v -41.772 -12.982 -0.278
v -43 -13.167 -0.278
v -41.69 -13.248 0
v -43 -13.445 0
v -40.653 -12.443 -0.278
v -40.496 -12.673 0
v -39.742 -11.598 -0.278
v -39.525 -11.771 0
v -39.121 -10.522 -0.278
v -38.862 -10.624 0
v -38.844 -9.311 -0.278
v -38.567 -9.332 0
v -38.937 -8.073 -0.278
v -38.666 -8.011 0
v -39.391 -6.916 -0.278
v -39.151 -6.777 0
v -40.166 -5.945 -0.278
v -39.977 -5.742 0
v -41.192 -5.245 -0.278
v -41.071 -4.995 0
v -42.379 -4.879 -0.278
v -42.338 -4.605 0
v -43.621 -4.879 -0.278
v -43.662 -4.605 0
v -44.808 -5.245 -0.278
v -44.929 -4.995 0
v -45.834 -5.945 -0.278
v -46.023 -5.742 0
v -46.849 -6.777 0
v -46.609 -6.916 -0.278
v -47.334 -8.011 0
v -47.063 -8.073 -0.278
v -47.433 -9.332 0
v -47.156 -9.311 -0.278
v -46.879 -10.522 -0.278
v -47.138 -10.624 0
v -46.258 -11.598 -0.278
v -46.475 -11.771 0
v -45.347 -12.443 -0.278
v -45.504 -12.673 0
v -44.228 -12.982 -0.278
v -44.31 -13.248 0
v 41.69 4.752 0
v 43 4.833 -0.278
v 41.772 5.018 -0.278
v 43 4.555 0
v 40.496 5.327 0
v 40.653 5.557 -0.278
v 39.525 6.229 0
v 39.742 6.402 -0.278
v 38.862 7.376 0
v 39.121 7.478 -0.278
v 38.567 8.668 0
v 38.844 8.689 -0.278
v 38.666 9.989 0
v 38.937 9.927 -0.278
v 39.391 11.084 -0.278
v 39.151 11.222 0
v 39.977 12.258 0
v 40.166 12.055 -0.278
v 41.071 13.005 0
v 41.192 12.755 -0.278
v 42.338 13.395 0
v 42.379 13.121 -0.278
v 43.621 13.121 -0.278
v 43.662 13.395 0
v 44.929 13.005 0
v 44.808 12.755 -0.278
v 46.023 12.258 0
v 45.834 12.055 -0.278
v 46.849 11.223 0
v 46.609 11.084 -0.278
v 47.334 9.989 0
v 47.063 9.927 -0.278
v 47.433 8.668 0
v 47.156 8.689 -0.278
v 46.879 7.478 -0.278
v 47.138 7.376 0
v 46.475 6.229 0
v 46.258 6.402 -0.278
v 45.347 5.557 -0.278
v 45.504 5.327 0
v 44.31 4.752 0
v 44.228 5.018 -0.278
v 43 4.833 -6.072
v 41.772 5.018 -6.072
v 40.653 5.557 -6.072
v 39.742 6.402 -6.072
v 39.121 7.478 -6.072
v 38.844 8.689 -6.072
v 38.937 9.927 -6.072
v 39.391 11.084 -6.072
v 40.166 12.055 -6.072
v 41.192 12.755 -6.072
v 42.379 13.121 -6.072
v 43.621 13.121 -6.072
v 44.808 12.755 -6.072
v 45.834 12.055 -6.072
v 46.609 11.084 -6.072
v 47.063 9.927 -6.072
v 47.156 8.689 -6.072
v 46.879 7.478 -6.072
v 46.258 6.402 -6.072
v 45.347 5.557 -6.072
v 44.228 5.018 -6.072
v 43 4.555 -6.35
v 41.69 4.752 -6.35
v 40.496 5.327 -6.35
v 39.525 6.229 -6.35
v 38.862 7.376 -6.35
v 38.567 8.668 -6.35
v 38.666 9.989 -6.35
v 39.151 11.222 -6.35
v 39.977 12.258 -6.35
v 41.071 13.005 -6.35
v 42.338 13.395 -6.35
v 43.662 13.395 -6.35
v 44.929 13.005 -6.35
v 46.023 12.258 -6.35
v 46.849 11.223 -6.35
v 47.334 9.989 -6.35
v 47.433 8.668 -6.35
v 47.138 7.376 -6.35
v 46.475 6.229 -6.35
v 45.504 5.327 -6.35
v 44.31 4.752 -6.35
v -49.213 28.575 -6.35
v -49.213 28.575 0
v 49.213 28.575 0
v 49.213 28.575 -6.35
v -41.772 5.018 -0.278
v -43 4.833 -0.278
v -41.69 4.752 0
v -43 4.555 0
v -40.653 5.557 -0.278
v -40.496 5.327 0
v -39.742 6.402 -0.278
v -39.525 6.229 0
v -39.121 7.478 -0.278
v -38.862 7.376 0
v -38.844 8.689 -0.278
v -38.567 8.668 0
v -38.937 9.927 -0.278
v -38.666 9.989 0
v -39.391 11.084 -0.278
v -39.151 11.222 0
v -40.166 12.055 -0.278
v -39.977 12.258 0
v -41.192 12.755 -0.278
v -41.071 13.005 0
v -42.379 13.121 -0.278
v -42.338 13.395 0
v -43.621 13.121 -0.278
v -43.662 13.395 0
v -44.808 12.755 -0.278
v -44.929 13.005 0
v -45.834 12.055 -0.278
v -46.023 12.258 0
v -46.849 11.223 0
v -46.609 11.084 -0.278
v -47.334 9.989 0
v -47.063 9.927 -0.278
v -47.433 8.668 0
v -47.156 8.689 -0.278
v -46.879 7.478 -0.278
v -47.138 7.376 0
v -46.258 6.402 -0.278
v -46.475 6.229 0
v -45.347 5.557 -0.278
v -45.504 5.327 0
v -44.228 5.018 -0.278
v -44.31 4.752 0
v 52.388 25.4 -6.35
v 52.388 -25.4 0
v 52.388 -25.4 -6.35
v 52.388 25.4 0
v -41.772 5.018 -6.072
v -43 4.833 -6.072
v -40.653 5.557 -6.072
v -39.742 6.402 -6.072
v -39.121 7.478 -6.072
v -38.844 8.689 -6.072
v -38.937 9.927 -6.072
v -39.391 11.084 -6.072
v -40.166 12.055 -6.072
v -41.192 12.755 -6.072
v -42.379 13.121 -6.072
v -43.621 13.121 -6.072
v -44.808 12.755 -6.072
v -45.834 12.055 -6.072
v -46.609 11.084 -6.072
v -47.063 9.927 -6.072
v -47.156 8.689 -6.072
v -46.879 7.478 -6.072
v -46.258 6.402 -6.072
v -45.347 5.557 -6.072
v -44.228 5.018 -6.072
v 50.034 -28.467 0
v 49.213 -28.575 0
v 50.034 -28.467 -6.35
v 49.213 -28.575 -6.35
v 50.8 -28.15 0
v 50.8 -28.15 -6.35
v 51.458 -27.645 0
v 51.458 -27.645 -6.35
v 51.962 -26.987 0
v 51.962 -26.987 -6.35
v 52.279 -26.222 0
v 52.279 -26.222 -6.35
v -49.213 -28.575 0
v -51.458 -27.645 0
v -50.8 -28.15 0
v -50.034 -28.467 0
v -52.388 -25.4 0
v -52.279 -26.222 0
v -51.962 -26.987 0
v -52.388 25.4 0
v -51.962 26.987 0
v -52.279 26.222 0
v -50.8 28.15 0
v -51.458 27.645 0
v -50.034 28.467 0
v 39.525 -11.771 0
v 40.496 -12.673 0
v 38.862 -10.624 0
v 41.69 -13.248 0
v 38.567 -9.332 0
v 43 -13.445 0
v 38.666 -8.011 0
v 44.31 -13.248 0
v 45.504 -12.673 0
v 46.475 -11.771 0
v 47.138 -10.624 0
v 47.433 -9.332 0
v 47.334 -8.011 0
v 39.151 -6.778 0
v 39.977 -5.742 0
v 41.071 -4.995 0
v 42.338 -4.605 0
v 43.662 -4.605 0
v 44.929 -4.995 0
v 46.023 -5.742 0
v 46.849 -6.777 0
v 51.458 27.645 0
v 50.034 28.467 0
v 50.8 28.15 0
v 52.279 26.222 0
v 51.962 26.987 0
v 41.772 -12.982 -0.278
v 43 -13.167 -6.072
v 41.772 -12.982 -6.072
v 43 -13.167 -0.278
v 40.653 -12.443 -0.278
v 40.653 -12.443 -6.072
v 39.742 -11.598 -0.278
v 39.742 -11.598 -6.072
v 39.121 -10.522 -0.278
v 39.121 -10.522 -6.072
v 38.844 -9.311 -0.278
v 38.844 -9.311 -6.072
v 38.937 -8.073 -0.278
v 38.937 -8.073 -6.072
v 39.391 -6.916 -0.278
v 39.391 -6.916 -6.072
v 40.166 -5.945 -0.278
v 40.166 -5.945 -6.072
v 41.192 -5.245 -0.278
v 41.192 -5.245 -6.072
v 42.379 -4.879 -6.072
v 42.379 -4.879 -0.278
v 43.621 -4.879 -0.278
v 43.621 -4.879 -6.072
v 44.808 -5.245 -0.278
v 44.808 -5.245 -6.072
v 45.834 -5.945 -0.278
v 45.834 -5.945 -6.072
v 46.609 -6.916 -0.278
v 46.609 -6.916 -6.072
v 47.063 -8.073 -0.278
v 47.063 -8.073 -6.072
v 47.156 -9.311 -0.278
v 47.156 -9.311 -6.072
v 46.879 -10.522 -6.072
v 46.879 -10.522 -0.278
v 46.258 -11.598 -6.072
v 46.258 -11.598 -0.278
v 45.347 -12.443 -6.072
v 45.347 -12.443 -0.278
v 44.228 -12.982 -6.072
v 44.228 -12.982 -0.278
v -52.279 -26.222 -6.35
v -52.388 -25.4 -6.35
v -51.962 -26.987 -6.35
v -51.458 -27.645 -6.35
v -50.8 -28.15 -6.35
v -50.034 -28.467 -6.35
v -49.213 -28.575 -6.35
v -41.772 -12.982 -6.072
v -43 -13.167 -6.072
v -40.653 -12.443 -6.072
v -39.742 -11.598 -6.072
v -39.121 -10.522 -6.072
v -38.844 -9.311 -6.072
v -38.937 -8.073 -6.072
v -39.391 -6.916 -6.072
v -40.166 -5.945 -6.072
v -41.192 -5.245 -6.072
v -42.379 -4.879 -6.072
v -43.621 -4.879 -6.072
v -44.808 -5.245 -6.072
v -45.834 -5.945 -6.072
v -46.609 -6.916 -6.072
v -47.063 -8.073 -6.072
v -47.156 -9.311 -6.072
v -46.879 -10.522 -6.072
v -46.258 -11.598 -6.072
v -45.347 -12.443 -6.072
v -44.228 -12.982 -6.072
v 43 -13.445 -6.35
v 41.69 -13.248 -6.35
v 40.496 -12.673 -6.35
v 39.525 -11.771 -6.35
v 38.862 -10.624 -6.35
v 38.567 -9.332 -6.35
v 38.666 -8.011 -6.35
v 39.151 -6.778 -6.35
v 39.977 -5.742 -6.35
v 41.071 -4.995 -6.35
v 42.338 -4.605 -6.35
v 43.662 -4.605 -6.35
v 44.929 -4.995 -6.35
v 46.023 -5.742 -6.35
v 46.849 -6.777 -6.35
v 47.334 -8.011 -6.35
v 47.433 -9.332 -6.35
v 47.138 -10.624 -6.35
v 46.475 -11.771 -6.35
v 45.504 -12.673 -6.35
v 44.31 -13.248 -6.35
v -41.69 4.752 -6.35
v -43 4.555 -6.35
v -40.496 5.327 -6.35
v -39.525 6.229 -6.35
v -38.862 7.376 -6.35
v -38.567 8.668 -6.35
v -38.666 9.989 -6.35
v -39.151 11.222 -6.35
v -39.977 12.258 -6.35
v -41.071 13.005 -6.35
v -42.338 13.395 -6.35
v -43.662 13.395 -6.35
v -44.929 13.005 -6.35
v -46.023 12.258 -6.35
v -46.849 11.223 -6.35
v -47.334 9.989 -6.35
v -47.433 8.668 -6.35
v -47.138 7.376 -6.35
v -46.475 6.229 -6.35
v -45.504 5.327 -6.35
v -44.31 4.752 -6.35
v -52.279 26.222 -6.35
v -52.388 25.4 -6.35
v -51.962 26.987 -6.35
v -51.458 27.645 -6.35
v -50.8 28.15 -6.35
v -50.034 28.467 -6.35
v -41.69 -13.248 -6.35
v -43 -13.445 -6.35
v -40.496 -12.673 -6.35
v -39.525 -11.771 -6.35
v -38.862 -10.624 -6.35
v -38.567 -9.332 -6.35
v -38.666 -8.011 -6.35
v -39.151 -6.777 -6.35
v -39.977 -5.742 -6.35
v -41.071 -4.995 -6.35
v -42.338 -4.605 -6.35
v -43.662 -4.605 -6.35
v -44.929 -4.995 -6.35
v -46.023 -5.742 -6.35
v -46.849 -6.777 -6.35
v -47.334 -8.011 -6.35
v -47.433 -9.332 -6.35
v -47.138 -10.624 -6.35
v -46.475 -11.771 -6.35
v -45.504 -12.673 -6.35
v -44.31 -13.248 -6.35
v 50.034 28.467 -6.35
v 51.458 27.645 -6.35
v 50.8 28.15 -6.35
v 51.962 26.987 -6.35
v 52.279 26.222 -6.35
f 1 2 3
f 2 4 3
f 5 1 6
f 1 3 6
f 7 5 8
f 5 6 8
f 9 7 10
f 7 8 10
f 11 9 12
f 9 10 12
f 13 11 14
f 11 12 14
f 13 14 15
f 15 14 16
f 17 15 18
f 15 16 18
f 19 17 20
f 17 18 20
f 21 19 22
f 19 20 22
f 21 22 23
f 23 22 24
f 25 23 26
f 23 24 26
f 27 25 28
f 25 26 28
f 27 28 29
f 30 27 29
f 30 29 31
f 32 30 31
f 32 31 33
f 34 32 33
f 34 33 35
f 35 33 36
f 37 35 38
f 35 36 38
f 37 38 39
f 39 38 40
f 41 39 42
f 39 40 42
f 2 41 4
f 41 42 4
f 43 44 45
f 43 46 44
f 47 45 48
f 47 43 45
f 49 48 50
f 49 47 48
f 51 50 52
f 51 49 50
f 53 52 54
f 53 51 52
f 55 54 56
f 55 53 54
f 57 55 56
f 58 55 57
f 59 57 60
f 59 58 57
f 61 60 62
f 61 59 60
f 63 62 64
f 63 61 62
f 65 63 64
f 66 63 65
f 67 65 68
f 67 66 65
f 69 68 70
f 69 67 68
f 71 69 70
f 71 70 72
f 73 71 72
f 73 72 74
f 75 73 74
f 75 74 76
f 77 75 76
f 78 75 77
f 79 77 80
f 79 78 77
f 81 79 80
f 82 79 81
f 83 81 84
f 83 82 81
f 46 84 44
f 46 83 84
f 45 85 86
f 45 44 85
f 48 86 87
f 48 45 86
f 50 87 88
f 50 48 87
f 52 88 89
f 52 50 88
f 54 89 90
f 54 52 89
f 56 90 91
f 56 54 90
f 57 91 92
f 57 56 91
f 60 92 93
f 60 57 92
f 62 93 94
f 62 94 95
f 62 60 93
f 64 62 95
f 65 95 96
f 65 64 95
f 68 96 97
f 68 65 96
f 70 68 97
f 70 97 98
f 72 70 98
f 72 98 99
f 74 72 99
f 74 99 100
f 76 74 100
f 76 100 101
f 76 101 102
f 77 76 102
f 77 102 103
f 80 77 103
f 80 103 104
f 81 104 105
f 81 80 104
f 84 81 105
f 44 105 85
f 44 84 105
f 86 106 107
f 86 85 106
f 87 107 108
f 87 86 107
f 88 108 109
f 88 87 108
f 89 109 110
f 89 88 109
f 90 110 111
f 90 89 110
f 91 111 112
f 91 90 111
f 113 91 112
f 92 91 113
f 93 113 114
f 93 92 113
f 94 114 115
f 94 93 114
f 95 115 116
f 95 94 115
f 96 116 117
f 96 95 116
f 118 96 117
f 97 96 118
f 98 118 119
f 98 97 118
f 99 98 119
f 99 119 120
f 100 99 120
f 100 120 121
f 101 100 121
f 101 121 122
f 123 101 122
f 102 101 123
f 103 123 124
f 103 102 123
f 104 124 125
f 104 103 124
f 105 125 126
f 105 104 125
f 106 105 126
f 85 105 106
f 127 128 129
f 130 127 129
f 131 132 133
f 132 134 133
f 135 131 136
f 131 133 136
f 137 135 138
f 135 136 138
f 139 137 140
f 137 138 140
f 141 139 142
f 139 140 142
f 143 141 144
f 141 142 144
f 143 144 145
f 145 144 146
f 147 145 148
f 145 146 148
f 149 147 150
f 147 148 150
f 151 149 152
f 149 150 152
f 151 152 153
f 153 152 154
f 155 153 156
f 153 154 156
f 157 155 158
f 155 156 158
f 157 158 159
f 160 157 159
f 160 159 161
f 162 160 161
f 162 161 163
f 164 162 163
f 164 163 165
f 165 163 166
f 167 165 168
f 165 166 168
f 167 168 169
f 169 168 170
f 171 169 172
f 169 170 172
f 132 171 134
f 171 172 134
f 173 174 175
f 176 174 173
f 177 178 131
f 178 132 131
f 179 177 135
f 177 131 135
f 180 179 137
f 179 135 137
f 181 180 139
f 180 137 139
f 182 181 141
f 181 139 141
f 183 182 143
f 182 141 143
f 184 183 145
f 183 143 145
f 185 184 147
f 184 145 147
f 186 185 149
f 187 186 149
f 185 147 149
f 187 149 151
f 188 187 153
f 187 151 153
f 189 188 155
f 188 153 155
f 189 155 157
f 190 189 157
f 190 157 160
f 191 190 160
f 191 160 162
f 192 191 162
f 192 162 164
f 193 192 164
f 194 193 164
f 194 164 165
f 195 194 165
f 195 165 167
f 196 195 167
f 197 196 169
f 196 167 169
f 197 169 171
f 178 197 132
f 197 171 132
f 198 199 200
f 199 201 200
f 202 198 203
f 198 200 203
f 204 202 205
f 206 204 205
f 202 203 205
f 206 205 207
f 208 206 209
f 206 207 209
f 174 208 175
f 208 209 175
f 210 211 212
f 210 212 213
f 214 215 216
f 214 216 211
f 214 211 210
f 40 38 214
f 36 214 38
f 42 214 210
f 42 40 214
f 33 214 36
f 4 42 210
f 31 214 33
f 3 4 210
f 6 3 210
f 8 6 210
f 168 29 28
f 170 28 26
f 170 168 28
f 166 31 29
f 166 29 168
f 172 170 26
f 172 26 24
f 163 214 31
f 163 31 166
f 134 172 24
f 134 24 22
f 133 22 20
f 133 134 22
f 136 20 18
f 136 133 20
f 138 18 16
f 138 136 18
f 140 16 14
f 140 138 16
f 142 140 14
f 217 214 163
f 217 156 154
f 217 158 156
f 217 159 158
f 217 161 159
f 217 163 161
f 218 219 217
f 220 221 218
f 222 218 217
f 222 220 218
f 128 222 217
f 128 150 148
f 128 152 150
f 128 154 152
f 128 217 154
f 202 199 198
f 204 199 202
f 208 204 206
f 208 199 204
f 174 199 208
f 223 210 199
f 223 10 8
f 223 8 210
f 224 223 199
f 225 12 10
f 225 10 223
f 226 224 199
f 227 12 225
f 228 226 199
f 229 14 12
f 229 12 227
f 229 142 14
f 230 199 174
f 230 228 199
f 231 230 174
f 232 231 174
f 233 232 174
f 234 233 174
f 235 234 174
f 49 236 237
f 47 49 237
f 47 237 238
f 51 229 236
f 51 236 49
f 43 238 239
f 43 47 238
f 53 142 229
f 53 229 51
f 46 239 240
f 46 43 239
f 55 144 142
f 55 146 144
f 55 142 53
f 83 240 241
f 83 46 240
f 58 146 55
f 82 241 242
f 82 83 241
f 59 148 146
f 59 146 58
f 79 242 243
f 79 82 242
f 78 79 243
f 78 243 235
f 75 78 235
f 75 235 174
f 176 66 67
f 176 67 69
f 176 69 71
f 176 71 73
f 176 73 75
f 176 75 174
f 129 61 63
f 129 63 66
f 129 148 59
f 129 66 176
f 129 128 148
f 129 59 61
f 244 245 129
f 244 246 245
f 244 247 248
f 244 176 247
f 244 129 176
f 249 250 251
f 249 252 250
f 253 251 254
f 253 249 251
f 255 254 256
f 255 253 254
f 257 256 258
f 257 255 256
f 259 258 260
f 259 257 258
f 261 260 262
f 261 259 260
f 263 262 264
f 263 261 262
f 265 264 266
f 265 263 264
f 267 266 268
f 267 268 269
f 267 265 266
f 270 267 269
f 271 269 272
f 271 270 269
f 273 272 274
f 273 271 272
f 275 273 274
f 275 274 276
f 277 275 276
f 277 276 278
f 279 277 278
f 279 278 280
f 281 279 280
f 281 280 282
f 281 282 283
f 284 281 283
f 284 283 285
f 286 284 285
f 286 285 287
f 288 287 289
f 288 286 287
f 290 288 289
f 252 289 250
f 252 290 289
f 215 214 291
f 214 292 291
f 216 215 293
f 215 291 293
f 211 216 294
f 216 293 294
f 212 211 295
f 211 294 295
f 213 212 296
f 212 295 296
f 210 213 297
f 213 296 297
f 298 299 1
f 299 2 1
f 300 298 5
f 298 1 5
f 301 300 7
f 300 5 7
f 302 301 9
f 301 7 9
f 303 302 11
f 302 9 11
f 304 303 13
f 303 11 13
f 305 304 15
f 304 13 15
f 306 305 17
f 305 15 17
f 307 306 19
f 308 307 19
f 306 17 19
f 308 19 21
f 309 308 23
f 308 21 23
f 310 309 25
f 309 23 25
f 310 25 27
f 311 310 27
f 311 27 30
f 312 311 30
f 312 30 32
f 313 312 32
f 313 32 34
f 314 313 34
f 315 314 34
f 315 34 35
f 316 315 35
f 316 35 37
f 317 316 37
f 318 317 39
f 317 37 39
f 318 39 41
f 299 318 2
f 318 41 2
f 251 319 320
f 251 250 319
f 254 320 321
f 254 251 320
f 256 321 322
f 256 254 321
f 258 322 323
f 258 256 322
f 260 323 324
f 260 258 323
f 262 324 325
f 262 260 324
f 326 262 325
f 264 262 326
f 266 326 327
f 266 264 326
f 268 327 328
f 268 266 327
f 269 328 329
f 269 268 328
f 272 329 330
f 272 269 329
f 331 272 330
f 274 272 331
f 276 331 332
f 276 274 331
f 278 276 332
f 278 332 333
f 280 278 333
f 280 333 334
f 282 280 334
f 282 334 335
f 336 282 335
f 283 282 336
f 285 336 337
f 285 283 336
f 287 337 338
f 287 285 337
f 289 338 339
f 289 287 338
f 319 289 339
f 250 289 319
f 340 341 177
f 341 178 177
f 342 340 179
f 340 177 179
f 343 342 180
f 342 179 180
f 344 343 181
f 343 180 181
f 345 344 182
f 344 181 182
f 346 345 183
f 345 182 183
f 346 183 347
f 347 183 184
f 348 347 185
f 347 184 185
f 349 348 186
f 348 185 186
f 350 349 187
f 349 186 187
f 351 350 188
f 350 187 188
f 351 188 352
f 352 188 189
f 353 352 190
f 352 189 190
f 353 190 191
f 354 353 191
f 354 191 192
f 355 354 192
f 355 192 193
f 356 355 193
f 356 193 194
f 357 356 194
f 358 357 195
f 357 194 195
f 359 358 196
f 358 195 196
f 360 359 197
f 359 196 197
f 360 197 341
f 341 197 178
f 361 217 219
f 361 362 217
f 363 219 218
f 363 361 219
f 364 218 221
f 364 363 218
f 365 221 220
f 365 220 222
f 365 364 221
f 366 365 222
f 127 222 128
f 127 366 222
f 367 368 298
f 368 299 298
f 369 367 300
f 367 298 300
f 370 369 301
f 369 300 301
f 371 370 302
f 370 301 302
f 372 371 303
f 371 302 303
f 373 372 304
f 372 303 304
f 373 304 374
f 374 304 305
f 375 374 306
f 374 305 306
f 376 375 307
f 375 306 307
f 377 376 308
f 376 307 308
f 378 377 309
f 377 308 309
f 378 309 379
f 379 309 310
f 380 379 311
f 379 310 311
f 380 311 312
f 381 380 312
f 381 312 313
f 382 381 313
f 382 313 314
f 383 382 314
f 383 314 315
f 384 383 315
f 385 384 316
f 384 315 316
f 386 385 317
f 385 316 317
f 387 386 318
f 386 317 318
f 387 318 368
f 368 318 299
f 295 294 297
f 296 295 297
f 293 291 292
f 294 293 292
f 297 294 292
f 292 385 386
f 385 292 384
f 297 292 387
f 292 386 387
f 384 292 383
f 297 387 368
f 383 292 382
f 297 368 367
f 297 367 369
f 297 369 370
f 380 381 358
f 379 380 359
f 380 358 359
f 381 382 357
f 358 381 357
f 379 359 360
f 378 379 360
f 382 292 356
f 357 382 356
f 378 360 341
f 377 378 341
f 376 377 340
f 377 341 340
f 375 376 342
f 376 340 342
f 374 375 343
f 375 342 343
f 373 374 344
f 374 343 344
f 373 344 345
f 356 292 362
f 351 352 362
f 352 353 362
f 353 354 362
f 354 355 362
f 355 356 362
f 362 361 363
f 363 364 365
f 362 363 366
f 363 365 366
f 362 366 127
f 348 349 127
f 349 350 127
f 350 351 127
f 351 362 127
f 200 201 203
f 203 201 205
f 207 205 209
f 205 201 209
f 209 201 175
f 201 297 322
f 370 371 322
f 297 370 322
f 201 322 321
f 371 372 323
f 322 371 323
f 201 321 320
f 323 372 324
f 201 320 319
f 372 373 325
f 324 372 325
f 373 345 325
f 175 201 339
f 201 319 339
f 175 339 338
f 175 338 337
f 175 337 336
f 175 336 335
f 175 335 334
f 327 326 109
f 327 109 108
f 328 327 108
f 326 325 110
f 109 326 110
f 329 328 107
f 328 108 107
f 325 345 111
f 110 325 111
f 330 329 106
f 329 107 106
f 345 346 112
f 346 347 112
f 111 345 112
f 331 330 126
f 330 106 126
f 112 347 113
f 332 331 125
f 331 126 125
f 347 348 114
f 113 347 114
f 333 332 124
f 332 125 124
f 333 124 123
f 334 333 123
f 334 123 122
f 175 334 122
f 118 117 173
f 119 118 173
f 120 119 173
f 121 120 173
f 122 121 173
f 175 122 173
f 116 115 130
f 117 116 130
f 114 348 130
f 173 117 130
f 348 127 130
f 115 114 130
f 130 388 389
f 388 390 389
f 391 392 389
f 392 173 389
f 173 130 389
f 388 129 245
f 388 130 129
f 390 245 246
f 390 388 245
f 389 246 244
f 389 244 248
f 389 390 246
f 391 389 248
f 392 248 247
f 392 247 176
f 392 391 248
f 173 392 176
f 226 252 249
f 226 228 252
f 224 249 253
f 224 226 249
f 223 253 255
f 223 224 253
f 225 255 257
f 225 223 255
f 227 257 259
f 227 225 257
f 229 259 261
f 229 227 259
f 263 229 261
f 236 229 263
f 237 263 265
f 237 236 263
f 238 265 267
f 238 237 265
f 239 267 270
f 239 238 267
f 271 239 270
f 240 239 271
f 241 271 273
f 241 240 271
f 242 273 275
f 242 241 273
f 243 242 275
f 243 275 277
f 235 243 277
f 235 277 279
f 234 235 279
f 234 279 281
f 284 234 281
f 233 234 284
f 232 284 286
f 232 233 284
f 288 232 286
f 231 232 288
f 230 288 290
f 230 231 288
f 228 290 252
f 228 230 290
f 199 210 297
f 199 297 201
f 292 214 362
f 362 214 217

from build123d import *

# Parameters (mm, degrees)
SKETCH1_W                                 = 104.775
SKETCH1_H                                 = 57.15
BOSS_EXTRUDE1_DEPTH                       = 6.35
F_21_64_0_32813_DIAMETER_HOLE1_AT_2_COUNT = 2
F_21_64_0_32813_DIAMETER_HOLE1_AT_2_PITCH = 18
FILLET1_R                                 = 3.175


with BuildPart() as part:
    # Sketch1 → Boss-Extrude1 (new body)
    with BuildSketch(Plane.XY):
        Rectangle(SKETCH1_W, SKETCH1_H)
    extrude(amount=-BOSS_EXTRUDE1_DEPTH)

    # Sketch2 → 21/64 (0.32813) Diameter Hole1 (revolve, cut)
    with BuildSketch(Plane(origin=(43.000000106, 9, 0), x_dir=(0, -1, 0), z_dir=(1, 0, 0))):
        Polygon((0, 0), (0, 6.35), (4.445, 6.35), (4.167251, 6.072251), (4.167251, 0.277749), (4.445, 0), align=None)
    f_21_64_0_32813_diameter_hole1 = revolve(axis=Axis((43.000000106, 9, 6.35), (0, 0, -1)), mode=Mode.SUBTRACT)

    # 21/64 (0.32813) Diameter Hole1 at 2: 21/64 (0.32813) Diameter Hole1 ×2
    with Locations(*[(0, -i * F_21_64_0_32813_DIAMETER_HOLE1_AT_2_PITCH, 0) for i in range(1, F_21_64_0_32813_DIAMETER_HOLE1_AT_2_COUNT)]):
        add(f_21_64_0_32813_diameter_hole1, mode=Mode.SUBTRACT)

    # Mirror1: 21/64 (0.32813) Diameter Hole1 across plane
    add(f_21_64_0_32813_diameter_hole1.mirror(Plane(origin=(0, 0, 0), x_dir=(0, 0, 1), z_dir=(1, 0, 0))), mode=Mode.SUBTRACT)

    # Mirror1 copy 1 sketch → Mirror1 copy 1 (revolve, cut)
    with BuildSketch(Plane(origin=(-43.000000106, -9, 0), x_dir=(0, -1, 0), z_dir=(-1, 0, 0))):
        Polygon((0, 0), (0, -6.35), (4.445, -6.35), (4.167251, -6.072251), (4.167251, -0.277749), (4.445, 0), align=None)
    revolve(axis=Axis((-43.000000106, -9, 6.35), (0, 0, 1)), mode=Mode.SUBTRACT)

    # Fillet1
    fillet1_edges = [part.edges().sort_by_distance(p)[0] for p in [
        (-52.3875, 28.575, -3.175),
        (52.3875, 28.575, -3.175),
        (52.3875, -28.575, -3.175),
        (-52.3875, -28.575, -3.175),
    ]]
    fillet(fillet1_edges, radius=FILLET1_R)


solid = part.part
